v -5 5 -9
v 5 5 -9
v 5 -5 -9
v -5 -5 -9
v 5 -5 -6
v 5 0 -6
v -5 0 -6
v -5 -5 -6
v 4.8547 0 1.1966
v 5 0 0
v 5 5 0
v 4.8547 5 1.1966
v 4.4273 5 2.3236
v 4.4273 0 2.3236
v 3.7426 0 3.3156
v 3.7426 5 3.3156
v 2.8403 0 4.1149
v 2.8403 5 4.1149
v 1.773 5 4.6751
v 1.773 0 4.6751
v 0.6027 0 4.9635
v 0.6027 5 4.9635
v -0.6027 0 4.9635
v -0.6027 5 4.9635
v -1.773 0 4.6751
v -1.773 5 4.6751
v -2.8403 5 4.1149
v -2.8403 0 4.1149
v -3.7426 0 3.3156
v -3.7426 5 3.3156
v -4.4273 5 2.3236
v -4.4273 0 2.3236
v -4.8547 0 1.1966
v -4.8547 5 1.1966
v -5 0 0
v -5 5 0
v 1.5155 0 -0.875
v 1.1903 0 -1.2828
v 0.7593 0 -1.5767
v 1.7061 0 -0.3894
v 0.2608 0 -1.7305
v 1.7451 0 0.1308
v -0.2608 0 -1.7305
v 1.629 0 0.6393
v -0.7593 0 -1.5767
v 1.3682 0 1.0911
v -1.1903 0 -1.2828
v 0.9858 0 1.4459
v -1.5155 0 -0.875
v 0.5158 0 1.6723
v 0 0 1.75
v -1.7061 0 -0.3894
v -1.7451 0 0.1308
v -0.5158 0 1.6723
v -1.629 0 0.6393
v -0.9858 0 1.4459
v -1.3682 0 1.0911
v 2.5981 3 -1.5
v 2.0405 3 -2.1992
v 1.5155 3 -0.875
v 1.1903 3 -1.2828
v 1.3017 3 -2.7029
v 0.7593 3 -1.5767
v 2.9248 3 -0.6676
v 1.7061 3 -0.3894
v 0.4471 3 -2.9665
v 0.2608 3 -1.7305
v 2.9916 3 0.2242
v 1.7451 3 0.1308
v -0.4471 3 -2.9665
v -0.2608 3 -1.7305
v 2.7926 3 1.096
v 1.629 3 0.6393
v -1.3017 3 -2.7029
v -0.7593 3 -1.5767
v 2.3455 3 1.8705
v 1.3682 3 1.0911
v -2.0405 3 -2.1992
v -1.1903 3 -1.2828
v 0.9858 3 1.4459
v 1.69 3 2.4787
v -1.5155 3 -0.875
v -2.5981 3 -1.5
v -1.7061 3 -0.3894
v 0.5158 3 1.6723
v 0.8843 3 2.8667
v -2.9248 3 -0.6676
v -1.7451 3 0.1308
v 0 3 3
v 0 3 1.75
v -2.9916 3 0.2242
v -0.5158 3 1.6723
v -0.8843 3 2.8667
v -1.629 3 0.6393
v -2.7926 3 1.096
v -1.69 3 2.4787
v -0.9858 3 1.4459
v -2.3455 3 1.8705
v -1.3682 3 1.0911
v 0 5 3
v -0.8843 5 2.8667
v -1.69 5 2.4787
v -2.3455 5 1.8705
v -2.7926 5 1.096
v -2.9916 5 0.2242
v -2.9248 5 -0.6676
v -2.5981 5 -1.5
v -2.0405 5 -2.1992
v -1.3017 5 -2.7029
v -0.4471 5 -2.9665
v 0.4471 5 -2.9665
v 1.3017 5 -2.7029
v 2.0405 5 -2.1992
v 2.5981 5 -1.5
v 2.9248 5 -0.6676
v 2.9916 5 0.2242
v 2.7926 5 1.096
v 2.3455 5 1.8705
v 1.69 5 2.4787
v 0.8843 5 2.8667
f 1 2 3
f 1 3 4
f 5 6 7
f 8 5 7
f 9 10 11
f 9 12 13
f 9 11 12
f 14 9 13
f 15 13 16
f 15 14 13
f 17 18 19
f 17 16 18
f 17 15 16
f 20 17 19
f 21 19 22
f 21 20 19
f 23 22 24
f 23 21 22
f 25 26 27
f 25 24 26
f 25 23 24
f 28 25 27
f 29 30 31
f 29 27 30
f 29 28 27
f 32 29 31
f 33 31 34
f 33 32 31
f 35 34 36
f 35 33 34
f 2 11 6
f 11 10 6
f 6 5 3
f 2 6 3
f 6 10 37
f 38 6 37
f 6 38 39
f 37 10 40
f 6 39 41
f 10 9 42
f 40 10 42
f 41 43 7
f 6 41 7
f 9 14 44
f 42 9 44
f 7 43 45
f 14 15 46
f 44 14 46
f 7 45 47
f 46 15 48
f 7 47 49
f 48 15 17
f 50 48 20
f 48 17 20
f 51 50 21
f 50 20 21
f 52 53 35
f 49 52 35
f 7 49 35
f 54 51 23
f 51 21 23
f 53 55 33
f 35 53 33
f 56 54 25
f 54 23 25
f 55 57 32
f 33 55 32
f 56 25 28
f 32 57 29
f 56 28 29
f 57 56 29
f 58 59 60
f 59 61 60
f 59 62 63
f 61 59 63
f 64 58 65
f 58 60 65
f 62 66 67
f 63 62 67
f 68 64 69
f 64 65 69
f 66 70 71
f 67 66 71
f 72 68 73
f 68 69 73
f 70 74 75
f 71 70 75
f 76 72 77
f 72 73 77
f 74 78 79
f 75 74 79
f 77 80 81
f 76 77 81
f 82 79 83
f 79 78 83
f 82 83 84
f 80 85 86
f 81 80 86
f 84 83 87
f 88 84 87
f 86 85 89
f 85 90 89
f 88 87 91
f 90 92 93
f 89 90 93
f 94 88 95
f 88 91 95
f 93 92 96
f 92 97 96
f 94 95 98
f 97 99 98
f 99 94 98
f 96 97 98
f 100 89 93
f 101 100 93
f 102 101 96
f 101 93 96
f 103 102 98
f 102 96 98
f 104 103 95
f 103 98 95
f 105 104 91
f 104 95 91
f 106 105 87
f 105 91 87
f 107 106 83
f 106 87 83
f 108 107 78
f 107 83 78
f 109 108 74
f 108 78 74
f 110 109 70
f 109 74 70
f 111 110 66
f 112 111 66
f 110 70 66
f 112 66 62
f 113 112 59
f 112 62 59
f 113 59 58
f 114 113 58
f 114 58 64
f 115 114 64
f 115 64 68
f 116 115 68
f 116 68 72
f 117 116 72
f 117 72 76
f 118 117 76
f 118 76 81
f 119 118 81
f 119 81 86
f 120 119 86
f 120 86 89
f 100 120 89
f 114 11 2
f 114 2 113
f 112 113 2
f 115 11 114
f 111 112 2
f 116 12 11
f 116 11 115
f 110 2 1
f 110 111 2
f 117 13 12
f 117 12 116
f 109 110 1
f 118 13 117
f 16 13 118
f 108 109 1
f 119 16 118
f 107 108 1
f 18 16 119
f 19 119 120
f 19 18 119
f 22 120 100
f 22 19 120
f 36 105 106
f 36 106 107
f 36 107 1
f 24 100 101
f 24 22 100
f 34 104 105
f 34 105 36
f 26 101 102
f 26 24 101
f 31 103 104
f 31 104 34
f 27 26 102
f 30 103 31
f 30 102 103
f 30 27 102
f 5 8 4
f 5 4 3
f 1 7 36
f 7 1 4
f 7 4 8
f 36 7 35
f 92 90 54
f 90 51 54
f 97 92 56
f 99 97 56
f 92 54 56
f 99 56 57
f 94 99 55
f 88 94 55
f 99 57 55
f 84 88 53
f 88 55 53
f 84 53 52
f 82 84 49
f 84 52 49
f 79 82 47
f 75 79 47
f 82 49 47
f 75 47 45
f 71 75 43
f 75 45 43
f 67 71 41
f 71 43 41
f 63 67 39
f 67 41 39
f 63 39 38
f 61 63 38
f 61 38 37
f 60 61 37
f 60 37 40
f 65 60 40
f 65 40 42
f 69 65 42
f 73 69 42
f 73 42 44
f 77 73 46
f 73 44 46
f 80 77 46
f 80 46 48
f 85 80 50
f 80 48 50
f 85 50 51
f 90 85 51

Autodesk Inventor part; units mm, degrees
ref_plane "YZ Plane" through (0, 0, 0) normal (1, 0, 0) x (0, 1, 0)
ref_plane "XZ Plane" through (0, 0, 0) normal (0, 1, 0) x (-1, 0, 0)
ref_plane "XY Plane" through (0, 0, 0) normal (0, 0, 1) x (1, 0, 0)
sketch "Szkic1" plane through (0, 0, 0) normal (0, 1, 0) x (-1, 0, 0)
  circle A0 centre (0, 0) radius 1.5
  circle A1 centre (0, 0) radius 5
  line L0 (5, 0) -> (-5, 0)
  line L1 (-5, 0) -> (-5, -6)
  line L2 (-5, -6) -> (5, -6)
  line L3 (5, -6) -> (5, 0)
  dimension "d1" = 10
  dimension "d0" = 3
  dimension "d2" = 6
extrude "Wyciągnięcie proste1" add sketch "Szkic1" along normal blind 5
sketch "Szkic2" plane through (5, 0, -6) normal (0, 0, -1) x (-1, 0, 0)
  line L0 (0, 0) -> (10, 0) projected
  line L1 (10, 0) -> (10, 5) projected
  line L2 (0, 5) -> (10, 5) projected
  line L3 (0, 0) -> (0, 5) projected
  line L4 (0, 5) -> (10, 5)
  line L5 (10, 5) -> (10, -5)
  line L6 (10, -5) -> (0, -5)
  line L7 (0, -5) -> (0, 5)
  point P0 (5, 0)
  dimension "d5" = 5
extrude "Wyciągnięcie proste2" add sketch "Szkic2" along normal blind 3
sketch "Szkic3" plane through (0, 5, 0) normal (0, 1, 0) x (1, 0, 0)
  point P0 (0, 0)
  point P1 (0, 0)
hole "Otwór1" at (0, 5, 0) direction (0, -1, 0) diameter 3.5 end through all counterbore diameter 6 counterbore depth 2
properties part number "podpora_lewa"
